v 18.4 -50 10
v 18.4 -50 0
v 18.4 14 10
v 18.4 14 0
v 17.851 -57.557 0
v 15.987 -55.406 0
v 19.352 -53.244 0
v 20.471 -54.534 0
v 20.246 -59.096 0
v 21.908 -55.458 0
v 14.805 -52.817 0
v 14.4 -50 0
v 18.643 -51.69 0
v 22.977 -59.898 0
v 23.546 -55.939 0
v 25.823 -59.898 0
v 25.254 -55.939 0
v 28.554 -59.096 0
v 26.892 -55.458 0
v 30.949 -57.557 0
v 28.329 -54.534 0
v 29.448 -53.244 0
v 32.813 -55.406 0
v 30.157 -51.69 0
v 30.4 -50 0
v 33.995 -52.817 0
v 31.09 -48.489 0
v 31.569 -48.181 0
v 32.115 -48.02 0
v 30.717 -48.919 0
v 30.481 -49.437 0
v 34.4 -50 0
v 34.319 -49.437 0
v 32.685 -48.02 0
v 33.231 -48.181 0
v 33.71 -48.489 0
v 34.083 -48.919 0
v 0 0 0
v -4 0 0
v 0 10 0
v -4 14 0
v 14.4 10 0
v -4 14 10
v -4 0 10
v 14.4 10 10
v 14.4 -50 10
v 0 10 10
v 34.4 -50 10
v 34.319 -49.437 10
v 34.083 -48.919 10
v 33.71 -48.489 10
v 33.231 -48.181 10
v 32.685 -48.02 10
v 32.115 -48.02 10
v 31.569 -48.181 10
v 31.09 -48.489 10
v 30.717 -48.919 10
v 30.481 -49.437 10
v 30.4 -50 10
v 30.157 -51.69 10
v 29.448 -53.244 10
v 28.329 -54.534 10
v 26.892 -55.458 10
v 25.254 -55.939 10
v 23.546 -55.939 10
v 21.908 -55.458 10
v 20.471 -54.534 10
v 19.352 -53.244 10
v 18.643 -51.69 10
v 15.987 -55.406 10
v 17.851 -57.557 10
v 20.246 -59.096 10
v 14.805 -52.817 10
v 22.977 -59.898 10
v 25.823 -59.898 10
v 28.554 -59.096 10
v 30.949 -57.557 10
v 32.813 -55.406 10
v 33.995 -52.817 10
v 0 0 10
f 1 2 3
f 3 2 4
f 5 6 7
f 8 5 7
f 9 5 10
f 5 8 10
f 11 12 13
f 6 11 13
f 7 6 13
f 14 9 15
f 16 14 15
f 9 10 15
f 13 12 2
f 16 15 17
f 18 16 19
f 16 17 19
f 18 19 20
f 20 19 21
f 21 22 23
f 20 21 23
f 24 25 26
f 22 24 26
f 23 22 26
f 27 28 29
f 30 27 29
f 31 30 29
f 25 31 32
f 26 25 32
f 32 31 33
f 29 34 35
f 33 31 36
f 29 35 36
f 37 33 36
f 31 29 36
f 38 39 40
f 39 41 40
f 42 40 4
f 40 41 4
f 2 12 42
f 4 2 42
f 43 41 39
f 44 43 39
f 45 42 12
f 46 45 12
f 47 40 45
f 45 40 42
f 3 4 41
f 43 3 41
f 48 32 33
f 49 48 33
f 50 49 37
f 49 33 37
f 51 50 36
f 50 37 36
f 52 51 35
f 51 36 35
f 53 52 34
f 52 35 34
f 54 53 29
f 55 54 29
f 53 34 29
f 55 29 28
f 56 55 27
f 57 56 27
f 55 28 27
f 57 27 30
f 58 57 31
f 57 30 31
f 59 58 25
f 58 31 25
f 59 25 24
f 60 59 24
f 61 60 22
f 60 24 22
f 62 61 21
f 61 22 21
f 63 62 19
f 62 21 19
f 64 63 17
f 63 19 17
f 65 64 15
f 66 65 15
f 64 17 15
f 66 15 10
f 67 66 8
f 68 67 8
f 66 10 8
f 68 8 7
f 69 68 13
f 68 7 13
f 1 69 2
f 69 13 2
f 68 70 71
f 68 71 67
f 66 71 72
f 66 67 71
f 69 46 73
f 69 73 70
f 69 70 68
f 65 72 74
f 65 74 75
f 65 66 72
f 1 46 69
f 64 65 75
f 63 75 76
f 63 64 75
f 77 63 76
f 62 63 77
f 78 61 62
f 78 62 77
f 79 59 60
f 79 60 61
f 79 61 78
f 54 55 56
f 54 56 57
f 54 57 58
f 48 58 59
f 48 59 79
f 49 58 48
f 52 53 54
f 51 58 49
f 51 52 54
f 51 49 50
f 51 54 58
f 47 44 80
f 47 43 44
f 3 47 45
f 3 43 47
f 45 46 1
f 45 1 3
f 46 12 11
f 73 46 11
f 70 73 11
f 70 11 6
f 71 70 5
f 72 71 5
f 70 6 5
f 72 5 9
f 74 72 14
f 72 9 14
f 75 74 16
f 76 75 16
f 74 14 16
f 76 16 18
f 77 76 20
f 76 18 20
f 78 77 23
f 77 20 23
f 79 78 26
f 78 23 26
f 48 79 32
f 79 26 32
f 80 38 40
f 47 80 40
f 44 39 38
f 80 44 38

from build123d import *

# Parameters (mm, degrees)
F1_DEPTH = 10


with BuildPart() as f1:
    # F0 (on Top) → F1 (new body)
    with BuildSketch(Plane.XY):
        with BuildLine():
            Line((-4, 0), (0, 0))
            Line((0, 0), (0, 10))
            Line((0, 10), (14.4, 10))
            Line((14.4, 10), (14.4, -50))
            ThreePointArc((14.4, -50), (24.4, -60), (34.4, -50))
            ThreePointArc((34.4, -50), (32.4, -48), (30.4, -50))
            ThreePointArc((30.4, -50), (24.4, -56), (18.4, -50))
            Line((18.4, -50), (18.4, 14))
            Line((18.4, 14), (-4, 14))
            Line((-4, 14), (-4, 0))
        make_face()
    extrude(amount=F1_DEPTH)


solid = f1.part
